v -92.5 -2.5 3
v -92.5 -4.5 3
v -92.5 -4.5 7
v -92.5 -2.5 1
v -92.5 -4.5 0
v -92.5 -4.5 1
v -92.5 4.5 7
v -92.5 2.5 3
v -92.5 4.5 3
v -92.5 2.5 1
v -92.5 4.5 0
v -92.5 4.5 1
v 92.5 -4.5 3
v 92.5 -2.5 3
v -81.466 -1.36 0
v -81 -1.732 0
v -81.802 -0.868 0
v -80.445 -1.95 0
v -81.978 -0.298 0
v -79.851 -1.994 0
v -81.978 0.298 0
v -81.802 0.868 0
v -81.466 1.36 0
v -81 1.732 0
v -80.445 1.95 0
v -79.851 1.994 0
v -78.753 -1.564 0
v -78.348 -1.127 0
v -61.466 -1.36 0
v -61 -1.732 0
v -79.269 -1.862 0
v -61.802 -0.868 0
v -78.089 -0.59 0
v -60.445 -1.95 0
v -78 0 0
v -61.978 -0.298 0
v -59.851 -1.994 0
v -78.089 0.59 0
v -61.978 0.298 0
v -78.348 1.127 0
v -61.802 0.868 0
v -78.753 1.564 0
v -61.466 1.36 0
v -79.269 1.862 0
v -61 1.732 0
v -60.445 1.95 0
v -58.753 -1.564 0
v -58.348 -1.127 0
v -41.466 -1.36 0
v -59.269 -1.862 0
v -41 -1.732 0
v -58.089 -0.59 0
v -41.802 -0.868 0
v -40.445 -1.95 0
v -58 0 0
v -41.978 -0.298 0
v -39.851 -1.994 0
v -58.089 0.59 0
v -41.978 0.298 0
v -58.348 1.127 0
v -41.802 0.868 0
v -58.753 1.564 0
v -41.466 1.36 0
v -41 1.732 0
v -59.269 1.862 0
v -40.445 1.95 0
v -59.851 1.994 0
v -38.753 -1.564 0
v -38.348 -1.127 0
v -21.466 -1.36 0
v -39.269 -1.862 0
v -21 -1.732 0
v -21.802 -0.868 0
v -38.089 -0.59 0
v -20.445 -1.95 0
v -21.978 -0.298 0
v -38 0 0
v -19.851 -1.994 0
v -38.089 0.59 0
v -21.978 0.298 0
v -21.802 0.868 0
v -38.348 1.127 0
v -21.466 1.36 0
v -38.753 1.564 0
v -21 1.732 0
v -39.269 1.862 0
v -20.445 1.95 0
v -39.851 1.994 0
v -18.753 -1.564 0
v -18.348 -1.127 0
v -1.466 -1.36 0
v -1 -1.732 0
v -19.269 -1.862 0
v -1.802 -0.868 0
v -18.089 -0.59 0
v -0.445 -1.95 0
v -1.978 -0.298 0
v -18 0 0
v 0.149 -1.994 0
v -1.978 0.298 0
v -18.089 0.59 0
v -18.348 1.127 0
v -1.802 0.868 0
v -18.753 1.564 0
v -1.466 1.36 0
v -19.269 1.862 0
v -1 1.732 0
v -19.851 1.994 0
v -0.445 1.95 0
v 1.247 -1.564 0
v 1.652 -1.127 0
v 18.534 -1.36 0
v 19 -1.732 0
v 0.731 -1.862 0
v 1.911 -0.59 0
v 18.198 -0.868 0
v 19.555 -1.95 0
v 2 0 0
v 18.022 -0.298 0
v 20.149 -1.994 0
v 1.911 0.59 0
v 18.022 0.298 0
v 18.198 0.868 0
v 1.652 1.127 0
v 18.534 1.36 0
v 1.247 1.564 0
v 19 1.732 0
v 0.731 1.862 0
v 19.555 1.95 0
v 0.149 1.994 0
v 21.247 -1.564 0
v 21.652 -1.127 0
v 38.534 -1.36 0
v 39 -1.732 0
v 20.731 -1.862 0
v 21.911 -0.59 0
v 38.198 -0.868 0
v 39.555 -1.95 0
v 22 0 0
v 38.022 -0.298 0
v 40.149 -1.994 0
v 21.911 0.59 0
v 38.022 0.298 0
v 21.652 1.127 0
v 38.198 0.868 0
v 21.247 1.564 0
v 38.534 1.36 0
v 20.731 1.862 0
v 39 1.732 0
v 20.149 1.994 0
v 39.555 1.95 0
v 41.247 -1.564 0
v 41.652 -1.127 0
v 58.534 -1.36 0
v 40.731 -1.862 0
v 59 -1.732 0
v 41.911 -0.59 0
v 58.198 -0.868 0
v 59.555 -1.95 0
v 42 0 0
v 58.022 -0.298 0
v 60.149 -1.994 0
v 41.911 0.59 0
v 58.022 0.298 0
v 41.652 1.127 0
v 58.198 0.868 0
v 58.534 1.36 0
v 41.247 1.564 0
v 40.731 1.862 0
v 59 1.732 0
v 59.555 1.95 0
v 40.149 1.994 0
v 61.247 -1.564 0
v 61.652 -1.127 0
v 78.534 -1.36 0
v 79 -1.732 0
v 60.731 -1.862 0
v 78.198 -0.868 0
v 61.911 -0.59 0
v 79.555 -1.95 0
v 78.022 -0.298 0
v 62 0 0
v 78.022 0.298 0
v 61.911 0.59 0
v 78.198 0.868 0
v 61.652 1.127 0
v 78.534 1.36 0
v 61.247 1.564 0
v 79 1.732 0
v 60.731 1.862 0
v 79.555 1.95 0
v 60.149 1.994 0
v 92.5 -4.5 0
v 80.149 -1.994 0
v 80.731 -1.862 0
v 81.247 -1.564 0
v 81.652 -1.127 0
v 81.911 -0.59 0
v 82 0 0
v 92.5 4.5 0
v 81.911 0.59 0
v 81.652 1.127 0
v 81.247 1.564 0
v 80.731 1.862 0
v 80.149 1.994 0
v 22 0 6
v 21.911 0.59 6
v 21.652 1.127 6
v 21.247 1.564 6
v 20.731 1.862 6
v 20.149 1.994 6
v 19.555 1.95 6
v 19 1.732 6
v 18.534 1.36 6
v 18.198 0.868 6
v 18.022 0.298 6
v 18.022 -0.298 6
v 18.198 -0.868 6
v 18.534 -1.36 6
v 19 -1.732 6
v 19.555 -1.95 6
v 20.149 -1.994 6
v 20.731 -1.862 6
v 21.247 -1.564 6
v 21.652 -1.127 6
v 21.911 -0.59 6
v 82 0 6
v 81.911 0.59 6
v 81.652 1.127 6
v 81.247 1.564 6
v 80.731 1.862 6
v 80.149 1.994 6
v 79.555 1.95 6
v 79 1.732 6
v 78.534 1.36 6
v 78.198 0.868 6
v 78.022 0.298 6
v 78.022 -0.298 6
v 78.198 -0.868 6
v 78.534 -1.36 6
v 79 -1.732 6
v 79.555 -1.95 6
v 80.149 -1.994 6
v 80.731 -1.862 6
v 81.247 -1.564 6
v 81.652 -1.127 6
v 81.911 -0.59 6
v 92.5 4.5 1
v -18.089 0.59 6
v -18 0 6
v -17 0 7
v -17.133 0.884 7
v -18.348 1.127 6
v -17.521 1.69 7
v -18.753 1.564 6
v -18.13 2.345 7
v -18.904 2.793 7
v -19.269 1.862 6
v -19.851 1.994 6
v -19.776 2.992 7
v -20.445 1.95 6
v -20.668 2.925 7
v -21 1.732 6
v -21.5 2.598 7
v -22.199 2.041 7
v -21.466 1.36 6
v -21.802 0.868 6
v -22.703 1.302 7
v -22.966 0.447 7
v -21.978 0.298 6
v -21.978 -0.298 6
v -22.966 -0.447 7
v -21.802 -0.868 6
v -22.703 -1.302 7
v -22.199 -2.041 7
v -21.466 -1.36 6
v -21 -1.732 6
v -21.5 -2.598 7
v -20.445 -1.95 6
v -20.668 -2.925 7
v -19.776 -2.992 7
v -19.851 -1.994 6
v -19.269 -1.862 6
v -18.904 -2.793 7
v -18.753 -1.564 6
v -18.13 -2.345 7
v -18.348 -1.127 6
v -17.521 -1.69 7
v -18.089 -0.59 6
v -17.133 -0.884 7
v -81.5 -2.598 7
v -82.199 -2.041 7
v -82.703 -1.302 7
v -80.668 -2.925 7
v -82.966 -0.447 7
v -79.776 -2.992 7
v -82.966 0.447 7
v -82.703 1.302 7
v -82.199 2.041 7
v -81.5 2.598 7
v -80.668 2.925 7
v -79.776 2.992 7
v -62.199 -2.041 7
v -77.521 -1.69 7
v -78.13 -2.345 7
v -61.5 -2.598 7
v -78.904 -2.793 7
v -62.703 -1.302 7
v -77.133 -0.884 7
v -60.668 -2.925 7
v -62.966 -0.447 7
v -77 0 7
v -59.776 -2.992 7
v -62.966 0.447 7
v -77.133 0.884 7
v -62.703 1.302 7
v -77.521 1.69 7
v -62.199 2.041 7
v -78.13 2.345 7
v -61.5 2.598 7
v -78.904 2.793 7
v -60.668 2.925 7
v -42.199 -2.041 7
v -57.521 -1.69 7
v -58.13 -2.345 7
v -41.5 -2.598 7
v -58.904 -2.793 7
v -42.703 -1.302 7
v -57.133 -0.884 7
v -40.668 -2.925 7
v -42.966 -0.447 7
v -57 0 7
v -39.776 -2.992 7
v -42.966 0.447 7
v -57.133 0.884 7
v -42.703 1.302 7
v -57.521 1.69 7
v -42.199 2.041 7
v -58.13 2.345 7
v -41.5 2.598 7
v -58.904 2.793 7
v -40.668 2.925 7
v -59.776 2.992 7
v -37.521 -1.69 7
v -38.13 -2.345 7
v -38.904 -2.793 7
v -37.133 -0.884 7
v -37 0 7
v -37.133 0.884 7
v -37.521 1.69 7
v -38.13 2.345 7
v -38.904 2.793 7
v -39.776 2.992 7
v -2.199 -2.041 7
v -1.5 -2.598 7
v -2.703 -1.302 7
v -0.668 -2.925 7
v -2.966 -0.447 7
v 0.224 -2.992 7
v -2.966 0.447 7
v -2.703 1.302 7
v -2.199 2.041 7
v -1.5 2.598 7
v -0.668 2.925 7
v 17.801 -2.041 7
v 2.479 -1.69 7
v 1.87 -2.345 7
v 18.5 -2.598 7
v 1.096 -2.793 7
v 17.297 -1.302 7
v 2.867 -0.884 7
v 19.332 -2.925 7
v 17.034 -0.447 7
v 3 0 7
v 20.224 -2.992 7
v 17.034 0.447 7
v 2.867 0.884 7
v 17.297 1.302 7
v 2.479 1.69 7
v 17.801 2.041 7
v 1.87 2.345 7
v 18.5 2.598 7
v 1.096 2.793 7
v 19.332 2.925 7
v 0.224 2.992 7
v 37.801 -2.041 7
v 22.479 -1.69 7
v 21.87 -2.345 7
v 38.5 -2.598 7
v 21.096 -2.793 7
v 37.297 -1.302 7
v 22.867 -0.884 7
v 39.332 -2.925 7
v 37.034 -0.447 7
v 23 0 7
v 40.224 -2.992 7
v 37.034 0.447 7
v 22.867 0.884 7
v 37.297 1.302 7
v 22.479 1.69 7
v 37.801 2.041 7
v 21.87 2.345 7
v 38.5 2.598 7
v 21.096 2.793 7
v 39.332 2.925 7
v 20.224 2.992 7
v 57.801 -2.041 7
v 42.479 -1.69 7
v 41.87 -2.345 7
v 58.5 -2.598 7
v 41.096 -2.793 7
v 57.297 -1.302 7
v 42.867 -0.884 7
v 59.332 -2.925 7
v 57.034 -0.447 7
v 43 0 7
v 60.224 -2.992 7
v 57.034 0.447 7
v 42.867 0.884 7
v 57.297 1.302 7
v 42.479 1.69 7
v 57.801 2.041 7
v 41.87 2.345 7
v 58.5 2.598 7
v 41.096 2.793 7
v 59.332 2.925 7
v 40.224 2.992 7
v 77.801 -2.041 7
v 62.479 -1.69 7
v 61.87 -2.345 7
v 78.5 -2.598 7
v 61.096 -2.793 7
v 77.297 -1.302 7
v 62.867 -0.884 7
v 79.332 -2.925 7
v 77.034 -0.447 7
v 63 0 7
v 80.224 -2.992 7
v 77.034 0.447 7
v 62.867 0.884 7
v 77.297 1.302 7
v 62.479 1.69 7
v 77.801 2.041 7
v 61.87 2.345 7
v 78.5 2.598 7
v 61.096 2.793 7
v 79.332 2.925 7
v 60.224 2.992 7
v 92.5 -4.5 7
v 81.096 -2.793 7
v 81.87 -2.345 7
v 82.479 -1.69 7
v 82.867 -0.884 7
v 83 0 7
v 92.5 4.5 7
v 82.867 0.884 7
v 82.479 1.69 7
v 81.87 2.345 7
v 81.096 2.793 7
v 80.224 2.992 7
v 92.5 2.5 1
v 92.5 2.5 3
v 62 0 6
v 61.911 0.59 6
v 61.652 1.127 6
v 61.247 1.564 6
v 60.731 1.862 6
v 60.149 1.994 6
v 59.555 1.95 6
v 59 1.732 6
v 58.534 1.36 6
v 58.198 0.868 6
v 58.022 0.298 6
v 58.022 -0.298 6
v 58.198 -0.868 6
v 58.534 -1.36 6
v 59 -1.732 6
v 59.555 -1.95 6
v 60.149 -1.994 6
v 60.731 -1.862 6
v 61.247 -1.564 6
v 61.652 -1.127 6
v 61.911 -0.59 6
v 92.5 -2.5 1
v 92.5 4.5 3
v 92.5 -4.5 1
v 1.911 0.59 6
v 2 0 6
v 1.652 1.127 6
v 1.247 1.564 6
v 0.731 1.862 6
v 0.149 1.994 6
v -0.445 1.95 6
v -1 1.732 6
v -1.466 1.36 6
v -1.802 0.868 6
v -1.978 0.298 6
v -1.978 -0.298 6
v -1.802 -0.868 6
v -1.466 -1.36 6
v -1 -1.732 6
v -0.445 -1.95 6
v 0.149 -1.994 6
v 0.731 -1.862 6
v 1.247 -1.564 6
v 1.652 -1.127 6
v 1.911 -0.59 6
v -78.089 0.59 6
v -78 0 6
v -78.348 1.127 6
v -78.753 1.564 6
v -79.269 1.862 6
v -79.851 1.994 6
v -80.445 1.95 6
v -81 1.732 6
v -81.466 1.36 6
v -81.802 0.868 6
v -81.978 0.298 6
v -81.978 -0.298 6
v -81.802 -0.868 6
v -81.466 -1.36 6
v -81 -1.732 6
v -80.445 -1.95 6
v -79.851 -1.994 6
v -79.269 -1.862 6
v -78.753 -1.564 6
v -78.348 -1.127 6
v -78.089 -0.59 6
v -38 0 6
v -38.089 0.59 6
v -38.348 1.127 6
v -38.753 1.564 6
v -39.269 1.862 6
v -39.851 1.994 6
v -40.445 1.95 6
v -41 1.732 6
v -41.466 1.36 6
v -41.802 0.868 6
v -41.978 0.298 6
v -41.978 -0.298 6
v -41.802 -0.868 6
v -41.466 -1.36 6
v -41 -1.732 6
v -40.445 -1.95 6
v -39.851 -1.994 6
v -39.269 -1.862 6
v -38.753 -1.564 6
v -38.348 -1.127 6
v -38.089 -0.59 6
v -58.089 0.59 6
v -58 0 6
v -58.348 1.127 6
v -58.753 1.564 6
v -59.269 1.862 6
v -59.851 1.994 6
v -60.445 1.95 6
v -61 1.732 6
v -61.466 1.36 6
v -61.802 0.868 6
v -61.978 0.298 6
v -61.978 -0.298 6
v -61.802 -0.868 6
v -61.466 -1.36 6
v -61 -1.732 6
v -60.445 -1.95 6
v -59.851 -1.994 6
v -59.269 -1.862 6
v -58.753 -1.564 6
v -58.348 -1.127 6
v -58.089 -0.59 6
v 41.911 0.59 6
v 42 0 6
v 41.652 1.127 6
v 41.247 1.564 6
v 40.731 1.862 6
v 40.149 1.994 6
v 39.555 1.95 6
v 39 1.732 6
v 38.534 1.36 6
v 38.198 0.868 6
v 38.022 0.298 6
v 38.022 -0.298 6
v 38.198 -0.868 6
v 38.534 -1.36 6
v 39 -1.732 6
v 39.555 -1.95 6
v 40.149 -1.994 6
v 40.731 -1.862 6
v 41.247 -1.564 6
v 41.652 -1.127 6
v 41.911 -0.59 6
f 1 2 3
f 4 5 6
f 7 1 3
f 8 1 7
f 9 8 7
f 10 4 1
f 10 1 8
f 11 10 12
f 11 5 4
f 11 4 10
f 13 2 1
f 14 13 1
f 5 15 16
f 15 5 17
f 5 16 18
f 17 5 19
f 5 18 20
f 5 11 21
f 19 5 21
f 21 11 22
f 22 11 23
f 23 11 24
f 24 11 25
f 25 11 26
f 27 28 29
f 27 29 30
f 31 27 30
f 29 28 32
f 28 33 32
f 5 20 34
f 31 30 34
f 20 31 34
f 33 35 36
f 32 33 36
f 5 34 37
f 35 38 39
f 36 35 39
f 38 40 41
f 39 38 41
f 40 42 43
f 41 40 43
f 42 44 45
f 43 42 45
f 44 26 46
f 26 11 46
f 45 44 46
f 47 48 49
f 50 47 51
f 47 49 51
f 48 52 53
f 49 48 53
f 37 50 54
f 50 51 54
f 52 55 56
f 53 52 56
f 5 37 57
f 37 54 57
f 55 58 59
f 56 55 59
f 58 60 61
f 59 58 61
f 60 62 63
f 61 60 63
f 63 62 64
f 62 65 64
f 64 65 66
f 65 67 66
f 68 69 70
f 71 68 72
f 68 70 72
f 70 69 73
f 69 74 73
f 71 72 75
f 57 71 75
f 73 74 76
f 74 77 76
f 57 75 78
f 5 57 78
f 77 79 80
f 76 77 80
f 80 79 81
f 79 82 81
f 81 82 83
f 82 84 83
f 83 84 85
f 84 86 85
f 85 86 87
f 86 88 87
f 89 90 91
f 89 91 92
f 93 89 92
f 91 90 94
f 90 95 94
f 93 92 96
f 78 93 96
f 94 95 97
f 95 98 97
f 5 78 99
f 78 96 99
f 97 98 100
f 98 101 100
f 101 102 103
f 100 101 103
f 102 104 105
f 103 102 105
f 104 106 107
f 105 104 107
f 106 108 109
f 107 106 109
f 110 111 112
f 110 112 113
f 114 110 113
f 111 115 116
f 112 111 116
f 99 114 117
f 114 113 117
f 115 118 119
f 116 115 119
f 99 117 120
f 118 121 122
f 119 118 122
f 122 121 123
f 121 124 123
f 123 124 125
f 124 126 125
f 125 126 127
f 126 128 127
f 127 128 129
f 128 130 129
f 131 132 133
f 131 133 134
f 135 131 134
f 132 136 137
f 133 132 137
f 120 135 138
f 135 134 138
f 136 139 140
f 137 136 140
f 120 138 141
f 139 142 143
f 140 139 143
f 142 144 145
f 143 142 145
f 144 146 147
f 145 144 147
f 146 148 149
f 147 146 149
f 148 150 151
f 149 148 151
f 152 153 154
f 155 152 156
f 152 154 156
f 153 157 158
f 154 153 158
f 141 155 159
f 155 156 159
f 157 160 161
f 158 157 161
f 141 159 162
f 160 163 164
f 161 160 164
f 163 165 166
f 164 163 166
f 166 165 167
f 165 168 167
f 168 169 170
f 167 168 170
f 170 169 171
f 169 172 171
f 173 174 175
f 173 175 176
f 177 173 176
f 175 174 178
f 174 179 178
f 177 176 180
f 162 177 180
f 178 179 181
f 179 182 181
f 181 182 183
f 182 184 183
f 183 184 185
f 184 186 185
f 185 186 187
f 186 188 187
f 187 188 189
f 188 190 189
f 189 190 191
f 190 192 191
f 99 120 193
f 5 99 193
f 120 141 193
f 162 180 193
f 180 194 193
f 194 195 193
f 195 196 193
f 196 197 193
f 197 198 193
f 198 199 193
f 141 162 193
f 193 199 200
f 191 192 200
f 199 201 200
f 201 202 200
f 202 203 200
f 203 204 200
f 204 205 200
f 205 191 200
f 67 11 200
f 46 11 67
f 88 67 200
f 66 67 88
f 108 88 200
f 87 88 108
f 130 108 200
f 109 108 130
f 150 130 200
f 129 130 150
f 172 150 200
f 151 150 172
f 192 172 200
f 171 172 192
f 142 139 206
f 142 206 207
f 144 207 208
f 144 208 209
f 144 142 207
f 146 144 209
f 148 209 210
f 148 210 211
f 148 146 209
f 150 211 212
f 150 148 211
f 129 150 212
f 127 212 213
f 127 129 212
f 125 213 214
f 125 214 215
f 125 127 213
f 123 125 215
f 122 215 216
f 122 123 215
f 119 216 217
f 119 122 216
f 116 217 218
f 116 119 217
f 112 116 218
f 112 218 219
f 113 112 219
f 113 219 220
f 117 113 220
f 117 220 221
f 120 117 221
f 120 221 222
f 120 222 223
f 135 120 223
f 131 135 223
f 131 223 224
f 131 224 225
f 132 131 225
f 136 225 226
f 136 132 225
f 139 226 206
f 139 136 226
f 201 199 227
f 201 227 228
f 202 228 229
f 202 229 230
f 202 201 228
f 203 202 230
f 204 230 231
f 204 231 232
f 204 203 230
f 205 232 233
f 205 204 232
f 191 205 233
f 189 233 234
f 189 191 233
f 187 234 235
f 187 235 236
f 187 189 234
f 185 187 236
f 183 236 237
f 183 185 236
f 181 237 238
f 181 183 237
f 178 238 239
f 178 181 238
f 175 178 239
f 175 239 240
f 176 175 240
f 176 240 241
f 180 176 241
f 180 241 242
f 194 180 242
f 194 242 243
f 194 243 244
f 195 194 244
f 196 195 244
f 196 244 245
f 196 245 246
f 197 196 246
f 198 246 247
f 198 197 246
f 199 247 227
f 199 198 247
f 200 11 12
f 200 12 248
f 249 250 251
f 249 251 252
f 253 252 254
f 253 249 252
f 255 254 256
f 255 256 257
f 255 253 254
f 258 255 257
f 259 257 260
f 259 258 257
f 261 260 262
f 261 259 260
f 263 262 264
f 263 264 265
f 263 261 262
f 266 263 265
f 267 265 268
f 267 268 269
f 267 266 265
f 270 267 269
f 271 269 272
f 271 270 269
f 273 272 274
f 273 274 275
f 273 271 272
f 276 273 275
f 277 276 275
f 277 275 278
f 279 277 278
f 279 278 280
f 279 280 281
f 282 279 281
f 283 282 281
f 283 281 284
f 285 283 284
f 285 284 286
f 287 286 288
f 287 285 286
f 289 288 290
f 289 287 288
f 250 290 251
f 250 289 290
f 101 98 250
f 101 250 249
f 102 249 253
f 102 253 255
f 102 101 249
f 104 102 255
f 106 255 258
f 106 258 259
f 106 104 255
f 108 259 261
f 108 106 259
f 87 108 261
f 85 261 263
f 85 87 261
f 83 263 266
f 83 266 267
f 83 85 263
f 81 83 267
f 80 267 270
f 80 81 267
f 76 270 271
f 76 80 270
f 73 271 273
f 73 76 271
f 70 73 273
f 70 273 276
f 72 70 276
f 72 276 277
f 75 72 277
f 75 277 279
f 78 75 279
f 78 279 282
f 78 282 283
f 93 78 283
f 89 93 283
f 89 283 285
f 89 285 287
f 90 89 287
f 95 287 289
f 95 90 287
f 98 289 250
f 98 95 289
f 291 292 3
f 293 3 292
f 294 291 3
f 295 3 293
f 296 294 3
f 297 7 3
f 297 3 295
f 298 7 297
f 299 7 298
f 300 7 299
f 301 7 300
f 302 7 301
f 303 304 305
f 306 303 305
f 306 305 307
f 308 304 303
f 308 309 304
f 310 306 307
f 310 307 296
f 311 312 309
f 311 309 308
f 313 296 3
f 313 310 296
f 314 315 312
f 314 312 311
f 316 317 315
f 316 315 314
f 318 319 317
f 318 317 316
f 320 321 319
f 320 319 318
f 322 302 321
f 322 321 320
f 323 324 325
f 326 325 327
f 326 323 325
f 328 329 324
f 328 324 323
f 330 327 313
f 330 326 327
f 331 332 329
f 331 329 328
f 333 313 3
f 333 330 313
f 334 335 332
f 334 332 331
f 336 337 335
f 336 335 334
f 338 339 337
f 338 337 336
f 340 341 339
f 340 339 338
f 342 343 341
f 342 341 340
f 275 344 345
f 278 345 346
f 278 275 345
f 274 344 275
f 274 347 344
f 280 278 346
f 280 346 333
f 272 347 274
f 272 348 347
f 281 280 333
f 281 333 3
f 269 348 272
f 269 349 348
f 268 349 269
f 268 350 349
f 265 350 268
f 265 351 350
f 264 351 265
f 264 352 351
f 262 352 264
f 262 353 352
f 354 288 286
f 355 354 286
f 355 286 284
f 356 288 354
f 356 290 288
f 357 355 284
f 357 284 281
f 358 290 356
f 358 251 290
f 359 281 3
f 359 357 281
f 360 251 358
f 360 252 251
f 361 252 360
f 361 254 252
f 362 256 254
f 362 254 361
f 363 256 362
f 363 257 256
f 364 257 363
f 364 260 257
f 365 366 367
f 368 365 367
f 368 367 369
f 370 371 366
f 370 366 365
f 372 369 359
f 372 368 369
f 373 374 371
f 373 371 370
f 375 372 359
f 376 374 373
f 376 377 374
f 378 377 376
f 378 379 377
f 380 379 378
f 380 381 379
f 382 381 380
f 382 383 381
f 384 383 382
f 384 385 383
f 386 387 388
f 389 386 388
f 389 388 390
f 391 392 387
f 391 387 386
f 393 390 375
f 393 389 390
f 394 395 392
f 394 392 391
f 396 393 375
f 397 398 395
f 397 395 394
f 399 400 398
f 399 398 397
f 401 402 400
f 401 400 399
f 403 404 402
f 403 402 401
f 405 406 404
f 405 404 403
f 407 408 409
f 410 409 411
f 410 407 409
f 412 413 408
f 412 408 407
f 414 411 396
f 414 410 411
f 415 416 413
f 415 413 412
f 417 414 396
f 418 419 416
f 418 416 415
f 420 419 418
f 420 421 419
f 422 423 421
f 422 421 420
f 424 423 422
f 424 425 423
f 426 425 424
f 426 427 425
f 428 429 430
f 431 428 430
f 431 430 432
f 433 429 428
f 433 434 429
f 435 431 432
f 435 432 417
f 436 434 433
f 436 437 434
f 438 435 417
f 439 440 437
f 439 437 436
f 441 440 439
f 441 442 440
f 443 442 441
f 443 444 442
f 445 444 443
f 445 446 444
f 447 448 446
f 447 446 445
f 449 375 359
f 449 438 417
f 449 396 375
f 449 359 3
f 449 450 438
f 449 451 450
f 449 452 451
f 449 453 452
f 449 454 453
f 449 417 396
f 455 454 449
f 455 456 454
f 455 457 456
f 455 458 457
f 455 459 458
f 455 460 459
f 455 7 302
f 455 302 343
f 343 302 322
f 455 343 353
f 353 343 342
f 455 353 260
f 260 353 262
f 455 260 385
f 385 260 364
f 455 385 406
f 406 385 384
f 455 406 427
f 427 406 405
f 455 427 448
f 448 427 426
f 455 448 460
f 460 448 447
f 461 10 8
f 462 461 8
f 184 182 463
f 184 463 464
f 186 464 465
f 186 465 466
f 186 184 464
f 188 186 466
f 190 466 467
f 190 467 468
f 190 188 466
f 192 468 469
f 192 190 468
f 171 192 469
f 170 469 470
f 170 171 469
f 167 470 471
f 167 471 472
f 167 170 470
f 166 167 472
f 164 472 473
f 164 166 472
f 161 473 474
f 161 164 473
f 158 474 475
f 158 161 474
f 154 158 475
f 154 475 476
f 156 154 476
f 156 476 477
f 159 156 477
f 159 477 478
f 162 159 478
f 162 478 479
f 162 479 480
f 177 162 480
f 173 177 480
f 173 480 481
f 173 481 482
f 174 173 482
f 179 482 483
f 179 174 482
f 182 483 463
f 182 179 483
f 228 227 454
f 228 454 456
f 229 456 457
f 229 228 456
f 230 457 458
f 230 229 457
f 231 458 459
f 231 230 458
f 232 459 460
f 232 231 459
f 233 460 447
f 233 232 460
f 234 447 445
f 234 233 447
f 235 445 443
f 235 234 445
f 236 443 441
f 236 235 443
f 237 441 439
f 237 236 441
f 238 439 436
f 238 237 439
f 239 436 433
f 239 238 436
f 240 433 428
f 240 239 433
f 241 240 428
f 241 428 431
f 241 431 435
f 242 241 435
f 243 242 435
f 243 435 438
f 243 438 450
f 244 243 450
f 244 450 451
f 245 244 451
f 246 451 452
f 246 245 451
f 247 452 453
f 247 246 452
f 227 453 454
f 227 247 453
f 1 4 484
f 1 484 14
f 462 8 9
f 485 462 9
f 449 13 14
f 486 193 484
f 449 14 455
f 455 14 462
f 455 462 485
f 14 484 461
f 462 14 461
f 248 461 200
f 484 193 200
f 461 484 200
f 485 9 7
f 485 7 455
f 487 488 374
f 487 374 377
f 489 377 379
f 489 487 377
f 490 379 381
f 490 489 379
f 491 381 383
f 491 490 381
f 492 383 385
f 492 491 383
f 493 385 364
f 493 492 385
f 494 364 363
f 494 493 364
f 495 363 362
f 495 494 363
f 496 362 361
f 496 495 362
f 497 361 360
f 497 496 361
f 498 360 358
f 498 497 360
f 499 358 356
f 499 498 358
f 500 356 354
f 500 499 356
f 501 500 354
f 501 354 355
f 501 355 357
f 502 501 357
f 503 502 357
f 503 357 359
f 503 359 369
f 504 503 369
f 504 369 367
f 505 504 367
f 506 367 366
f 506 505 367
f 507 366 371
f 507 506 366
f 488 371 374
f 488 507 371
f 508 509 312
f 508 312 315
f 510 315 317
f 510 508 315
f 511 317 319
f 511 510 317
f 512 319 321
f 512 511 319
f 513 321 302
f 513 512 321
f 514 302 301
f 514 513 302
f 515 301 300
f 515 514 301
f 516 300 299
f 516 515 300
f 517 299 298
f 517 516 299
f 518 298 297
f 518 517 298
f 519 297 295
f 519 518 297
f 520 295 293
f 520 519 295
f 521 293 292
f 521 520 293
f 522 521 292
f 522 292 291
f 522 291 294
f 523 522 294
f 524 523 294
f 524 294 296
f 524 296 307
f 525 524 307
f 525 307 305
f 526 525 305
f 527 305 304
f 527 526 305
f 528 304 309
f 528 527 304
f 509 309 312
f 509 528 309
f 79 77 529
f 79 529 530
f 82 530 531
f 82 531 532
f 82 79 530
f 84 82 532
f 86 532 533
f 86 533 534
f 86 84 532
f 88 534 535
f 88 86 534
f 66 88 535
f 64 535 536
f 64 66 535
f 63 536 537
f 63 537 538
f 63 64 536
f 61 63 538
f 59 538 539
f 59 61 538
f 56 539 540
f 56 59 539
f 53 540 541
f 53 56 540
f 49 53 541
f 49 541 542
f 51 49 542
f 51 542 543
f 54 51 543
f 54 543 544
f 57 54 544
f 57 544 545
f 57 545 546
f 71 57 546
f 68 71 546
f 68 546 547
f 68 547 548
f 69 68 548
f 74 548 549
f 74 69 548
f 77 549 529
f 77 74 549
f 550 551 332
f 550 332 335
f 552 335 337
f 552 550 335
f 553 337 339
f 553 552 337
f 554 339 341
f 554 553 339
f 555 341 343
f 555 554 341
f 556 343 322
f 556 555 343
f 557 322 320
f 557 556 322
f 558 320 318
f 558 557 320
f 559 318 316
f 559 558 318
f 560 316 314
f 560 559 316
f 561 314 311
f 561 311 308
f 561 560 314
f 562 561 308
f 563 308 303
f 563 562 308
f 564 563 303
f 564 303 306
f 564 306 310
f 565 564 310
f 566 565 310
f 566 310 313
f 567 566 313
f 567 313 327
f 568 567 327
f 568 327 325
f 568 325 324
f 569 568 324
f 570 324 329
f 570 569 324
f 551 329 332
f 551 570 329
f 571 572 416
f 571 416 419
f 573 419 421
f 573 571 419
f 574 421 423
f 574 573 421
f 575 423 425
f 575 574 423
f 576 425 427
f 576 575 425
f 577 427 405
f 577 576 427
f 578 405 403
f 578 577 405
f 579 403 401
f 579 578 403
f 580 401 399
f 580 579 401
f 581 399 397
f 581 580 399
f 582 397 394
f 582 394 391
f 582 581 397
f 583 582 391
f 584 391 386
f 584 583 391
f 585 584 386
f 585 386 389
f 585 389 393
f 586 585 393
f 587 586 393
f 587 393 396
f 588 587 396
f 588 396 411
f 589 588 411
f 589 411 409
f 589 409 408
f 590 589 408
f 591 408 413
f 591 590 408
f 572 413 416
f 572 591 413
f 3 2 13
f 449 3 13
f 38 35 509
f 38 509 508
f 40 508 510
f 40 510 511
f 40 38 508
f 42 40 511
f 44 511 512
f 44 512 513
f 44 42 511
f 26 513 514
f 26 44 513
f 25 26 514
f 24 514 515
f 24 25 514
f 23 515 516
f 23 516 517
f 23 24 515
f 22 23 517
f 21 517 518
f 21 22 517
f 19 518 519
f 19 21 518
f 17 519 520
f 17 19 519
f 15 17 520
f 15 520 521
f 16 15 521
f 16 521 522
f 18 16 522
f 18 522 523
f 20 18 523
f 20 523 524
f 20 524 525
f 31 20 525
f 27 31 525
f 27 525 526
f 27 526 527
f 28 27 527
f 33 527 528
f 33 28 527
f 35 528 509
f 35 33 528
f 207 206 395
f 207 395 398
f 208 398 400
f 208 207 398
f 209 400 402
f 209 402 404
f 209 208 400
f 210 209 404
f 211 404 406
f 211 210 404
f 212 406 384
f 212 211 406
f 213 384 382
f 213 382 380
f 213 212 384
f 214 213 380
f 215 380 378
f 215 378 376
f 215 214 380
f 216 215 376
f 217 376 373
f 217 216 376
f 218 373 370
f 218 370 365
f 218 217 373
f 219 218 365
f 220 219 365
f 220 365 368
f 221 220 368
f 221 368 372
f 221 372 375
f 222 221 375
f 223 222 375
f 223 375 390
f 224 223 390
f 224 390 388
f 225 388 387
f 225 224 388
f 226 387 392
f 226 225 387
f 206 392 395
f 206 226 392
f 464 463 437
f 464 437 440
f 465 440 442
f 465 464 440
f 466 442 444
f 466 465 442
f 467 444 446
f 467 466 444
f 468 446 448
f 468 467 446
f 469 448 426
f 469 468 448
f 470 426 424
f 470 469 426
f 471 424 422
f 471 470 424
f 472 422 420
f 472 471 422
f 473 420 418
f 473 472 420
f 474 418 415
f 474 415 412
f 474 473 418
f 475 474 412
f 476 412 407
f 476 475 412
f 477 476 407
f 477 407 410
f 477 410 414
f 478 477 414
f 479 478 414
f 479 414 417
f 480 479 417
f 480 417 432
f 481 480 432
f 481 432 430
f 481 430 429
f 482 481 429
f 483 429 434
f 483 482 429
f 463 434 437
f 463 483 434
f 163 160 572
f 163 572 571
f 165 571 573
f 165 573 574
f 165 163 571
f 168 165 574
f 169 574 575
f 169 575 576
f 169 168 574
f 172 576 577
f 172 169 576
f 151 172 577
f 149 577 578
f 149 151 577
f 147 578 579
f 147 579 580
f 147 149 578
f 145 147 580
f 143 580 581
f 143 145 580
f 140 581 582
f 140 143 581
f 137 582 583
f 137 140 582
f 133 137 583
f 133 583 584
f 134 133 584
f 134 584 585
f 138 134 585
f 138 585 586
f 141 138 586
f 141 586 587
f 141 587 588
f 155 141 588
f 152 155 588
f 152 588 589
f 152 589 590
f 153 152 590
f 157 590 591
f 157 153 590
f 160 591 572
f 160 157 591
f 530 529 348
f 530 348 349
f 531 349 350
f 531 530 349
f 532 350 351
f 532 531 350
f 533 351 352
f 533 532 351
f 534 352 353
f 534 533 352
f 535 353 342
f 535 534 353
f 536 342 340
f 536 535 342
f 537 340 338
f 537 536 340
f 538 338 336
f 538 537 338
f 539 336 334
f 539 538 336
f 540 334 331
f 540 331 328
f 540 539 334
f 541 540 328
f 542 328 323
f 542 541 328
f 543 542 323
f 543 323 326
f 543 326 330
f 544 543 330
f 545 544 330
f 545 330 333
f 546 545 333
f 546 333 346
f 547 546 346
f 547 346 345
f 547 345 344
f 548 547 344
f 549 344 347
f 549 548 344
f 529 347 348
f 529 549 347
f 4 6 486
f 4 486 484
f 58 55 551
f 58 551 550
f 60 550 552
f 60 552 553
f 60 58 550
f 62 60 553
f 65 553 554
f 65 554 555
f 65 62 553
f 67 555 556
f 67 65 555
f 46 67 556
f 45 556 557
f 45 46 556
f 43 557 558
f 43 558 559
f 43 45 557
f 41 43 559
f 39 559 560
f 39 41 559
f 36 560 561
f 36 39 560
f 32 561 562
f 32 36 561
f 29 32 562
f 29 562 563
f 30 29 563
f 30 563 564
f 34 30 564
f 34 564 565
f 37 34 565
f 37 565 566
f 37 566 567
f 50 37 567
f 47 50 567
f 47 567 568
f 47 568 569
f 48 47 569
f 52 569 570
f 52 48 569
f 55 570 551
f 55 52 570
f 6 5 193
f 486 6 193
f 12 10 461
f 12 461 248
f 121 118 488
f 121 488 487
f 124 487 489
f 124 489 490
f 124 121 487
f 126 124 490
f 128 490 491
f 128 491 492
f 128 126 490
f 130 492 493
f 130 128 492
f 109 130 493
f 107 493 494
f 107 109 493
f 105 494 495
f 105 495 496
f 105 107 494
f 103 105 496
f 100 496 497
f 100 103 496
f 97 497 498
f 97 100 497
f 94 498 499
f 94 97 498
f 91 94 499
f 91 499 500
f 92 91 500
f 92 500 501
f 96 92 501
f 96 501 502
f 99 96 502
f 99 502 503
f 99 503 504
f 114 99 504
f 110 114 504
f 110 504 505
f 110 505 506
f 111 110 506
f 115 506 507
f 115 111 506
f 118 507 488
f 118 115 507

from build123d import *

# Parameters (mm, degrees)
ESQUISSE1_W             = 185
ESQUISSE1_H             = 9
ESQUISSE1_R             = 2
BOSS_EXTRU_1_DEPTH      = 7
ENL_V_MAT_EXTRU_1_REACH = 187
ESQUISSE2_W             = 2
ESQUISSE2_H             = 2
CHANFREIN1_SIZE         = 1


with BuildPart() as part:
    # Esquisse1 → Boss.-Extru.1 (new body)
    with BuildSketch(Plane.XY):
        Rectangle(ESQUISSE1_W, ESQUISSE1_H)
        with Locations((-80, 0)):
            Circle(ESQUISSE1_R, mode=Mode.SUBTRACT)
        with Locations((-60, 0)):
            Circle(ESQUISSE1_R, mode=Mode.SUBTRACT)
        with Locations((-40, 0)):
            Circle(ESQUISSE1_R, mode=Mode.SUBTRACT)
        with Locations((-20, 0)):
            Circle(ESQUISSE1_R, mode=Mode.SUBTRACT)
        Circle(ESQUISSE1_R, mode=Mode.SUBTRACT)
        with Locations((20, 0)):
            Circle(ESQUISSE1_R, mode=Mode.SUBTRACT)
        with Locations((40, 0)):
            Circle(ESQUISSE1_R, mode=Mode.SUBTRACT)
        with Locations((60, 0)):
            Circle(ESQUISSE1_R, mode=Mode.SUBTRACT)
        with Locations((80, 0)):
            Circle(ESQUISSE1_R, mode=Mode.SUBTRACT)
    extrude(amount=BOSS_EXTRU_1_DEPTH)

    # Esquisse2 → Enlèv. mat.-Extru.1 (cut, up to next)
    with BuildSketch(Plane.ZY.offset(92.5), mode=Mode.PRIVATE) as enl_v_mat_extru_1_sk1:
        with Locations((2, 3.5)):
            Rectangle(ESQUISSE2_W, ESQUISSE2_H)
    enl_v_mat_extru_1_tool1 = extrude(enl_v_mat_extru_1_sk1.sketch, amount=-ENL_V_MAT_EXTRU_1_REACH, mode=Mode.PRIVATE) & part.part
    add(enl_v_mat_extru_1_tool1.solids().sort_by_distance((-92.5, 3.5, 2))[0], mode=Mode.SUBTRACT)
    # Esquisse2 → Enlèv. mat.-Extru.1 (cut, up to next)
    with BuildSketch(Plane.ZY.offset(92.5), mode=Mode.PRIVATE) as enl_v_mat_extru_1_sk2:
        with Locations((2, -3.5)):
            Rectangle(ESQUISSE2_W, ESQUISSE2_H)
    enl_v_mat_extru_1_tool2 = extrude(enl_v_mat_extru_1_sk2.sketch, amount=-ENL_V_MAT_EXTRU_1_REACH, mode=Mode.PRIVATE) & part.part
    add(enl_v_mat_extru_1_tool2.solids().sort_by_distance((-92.5, -3.5, 2))[0], mode=Mode.SUBTRACT)

    # Chanfrein1
    chanfrein1_edges = [part.edges().sort_by_distance(p)[0] for p in [
        (-82, 0, 7),
        (-62, 0, 7),
        (-42, 0, 7),
        (-22, 0, 7),
        (-2, 0, 7),
        (18, 0, 7),
        (38, 0, 7),
        (58, 0, 7),
        (78, 0, 7),
    ]]
    chamfer(chanfrein1_edges, length=CHANFREIN1_SIZE)


solid = part.part
